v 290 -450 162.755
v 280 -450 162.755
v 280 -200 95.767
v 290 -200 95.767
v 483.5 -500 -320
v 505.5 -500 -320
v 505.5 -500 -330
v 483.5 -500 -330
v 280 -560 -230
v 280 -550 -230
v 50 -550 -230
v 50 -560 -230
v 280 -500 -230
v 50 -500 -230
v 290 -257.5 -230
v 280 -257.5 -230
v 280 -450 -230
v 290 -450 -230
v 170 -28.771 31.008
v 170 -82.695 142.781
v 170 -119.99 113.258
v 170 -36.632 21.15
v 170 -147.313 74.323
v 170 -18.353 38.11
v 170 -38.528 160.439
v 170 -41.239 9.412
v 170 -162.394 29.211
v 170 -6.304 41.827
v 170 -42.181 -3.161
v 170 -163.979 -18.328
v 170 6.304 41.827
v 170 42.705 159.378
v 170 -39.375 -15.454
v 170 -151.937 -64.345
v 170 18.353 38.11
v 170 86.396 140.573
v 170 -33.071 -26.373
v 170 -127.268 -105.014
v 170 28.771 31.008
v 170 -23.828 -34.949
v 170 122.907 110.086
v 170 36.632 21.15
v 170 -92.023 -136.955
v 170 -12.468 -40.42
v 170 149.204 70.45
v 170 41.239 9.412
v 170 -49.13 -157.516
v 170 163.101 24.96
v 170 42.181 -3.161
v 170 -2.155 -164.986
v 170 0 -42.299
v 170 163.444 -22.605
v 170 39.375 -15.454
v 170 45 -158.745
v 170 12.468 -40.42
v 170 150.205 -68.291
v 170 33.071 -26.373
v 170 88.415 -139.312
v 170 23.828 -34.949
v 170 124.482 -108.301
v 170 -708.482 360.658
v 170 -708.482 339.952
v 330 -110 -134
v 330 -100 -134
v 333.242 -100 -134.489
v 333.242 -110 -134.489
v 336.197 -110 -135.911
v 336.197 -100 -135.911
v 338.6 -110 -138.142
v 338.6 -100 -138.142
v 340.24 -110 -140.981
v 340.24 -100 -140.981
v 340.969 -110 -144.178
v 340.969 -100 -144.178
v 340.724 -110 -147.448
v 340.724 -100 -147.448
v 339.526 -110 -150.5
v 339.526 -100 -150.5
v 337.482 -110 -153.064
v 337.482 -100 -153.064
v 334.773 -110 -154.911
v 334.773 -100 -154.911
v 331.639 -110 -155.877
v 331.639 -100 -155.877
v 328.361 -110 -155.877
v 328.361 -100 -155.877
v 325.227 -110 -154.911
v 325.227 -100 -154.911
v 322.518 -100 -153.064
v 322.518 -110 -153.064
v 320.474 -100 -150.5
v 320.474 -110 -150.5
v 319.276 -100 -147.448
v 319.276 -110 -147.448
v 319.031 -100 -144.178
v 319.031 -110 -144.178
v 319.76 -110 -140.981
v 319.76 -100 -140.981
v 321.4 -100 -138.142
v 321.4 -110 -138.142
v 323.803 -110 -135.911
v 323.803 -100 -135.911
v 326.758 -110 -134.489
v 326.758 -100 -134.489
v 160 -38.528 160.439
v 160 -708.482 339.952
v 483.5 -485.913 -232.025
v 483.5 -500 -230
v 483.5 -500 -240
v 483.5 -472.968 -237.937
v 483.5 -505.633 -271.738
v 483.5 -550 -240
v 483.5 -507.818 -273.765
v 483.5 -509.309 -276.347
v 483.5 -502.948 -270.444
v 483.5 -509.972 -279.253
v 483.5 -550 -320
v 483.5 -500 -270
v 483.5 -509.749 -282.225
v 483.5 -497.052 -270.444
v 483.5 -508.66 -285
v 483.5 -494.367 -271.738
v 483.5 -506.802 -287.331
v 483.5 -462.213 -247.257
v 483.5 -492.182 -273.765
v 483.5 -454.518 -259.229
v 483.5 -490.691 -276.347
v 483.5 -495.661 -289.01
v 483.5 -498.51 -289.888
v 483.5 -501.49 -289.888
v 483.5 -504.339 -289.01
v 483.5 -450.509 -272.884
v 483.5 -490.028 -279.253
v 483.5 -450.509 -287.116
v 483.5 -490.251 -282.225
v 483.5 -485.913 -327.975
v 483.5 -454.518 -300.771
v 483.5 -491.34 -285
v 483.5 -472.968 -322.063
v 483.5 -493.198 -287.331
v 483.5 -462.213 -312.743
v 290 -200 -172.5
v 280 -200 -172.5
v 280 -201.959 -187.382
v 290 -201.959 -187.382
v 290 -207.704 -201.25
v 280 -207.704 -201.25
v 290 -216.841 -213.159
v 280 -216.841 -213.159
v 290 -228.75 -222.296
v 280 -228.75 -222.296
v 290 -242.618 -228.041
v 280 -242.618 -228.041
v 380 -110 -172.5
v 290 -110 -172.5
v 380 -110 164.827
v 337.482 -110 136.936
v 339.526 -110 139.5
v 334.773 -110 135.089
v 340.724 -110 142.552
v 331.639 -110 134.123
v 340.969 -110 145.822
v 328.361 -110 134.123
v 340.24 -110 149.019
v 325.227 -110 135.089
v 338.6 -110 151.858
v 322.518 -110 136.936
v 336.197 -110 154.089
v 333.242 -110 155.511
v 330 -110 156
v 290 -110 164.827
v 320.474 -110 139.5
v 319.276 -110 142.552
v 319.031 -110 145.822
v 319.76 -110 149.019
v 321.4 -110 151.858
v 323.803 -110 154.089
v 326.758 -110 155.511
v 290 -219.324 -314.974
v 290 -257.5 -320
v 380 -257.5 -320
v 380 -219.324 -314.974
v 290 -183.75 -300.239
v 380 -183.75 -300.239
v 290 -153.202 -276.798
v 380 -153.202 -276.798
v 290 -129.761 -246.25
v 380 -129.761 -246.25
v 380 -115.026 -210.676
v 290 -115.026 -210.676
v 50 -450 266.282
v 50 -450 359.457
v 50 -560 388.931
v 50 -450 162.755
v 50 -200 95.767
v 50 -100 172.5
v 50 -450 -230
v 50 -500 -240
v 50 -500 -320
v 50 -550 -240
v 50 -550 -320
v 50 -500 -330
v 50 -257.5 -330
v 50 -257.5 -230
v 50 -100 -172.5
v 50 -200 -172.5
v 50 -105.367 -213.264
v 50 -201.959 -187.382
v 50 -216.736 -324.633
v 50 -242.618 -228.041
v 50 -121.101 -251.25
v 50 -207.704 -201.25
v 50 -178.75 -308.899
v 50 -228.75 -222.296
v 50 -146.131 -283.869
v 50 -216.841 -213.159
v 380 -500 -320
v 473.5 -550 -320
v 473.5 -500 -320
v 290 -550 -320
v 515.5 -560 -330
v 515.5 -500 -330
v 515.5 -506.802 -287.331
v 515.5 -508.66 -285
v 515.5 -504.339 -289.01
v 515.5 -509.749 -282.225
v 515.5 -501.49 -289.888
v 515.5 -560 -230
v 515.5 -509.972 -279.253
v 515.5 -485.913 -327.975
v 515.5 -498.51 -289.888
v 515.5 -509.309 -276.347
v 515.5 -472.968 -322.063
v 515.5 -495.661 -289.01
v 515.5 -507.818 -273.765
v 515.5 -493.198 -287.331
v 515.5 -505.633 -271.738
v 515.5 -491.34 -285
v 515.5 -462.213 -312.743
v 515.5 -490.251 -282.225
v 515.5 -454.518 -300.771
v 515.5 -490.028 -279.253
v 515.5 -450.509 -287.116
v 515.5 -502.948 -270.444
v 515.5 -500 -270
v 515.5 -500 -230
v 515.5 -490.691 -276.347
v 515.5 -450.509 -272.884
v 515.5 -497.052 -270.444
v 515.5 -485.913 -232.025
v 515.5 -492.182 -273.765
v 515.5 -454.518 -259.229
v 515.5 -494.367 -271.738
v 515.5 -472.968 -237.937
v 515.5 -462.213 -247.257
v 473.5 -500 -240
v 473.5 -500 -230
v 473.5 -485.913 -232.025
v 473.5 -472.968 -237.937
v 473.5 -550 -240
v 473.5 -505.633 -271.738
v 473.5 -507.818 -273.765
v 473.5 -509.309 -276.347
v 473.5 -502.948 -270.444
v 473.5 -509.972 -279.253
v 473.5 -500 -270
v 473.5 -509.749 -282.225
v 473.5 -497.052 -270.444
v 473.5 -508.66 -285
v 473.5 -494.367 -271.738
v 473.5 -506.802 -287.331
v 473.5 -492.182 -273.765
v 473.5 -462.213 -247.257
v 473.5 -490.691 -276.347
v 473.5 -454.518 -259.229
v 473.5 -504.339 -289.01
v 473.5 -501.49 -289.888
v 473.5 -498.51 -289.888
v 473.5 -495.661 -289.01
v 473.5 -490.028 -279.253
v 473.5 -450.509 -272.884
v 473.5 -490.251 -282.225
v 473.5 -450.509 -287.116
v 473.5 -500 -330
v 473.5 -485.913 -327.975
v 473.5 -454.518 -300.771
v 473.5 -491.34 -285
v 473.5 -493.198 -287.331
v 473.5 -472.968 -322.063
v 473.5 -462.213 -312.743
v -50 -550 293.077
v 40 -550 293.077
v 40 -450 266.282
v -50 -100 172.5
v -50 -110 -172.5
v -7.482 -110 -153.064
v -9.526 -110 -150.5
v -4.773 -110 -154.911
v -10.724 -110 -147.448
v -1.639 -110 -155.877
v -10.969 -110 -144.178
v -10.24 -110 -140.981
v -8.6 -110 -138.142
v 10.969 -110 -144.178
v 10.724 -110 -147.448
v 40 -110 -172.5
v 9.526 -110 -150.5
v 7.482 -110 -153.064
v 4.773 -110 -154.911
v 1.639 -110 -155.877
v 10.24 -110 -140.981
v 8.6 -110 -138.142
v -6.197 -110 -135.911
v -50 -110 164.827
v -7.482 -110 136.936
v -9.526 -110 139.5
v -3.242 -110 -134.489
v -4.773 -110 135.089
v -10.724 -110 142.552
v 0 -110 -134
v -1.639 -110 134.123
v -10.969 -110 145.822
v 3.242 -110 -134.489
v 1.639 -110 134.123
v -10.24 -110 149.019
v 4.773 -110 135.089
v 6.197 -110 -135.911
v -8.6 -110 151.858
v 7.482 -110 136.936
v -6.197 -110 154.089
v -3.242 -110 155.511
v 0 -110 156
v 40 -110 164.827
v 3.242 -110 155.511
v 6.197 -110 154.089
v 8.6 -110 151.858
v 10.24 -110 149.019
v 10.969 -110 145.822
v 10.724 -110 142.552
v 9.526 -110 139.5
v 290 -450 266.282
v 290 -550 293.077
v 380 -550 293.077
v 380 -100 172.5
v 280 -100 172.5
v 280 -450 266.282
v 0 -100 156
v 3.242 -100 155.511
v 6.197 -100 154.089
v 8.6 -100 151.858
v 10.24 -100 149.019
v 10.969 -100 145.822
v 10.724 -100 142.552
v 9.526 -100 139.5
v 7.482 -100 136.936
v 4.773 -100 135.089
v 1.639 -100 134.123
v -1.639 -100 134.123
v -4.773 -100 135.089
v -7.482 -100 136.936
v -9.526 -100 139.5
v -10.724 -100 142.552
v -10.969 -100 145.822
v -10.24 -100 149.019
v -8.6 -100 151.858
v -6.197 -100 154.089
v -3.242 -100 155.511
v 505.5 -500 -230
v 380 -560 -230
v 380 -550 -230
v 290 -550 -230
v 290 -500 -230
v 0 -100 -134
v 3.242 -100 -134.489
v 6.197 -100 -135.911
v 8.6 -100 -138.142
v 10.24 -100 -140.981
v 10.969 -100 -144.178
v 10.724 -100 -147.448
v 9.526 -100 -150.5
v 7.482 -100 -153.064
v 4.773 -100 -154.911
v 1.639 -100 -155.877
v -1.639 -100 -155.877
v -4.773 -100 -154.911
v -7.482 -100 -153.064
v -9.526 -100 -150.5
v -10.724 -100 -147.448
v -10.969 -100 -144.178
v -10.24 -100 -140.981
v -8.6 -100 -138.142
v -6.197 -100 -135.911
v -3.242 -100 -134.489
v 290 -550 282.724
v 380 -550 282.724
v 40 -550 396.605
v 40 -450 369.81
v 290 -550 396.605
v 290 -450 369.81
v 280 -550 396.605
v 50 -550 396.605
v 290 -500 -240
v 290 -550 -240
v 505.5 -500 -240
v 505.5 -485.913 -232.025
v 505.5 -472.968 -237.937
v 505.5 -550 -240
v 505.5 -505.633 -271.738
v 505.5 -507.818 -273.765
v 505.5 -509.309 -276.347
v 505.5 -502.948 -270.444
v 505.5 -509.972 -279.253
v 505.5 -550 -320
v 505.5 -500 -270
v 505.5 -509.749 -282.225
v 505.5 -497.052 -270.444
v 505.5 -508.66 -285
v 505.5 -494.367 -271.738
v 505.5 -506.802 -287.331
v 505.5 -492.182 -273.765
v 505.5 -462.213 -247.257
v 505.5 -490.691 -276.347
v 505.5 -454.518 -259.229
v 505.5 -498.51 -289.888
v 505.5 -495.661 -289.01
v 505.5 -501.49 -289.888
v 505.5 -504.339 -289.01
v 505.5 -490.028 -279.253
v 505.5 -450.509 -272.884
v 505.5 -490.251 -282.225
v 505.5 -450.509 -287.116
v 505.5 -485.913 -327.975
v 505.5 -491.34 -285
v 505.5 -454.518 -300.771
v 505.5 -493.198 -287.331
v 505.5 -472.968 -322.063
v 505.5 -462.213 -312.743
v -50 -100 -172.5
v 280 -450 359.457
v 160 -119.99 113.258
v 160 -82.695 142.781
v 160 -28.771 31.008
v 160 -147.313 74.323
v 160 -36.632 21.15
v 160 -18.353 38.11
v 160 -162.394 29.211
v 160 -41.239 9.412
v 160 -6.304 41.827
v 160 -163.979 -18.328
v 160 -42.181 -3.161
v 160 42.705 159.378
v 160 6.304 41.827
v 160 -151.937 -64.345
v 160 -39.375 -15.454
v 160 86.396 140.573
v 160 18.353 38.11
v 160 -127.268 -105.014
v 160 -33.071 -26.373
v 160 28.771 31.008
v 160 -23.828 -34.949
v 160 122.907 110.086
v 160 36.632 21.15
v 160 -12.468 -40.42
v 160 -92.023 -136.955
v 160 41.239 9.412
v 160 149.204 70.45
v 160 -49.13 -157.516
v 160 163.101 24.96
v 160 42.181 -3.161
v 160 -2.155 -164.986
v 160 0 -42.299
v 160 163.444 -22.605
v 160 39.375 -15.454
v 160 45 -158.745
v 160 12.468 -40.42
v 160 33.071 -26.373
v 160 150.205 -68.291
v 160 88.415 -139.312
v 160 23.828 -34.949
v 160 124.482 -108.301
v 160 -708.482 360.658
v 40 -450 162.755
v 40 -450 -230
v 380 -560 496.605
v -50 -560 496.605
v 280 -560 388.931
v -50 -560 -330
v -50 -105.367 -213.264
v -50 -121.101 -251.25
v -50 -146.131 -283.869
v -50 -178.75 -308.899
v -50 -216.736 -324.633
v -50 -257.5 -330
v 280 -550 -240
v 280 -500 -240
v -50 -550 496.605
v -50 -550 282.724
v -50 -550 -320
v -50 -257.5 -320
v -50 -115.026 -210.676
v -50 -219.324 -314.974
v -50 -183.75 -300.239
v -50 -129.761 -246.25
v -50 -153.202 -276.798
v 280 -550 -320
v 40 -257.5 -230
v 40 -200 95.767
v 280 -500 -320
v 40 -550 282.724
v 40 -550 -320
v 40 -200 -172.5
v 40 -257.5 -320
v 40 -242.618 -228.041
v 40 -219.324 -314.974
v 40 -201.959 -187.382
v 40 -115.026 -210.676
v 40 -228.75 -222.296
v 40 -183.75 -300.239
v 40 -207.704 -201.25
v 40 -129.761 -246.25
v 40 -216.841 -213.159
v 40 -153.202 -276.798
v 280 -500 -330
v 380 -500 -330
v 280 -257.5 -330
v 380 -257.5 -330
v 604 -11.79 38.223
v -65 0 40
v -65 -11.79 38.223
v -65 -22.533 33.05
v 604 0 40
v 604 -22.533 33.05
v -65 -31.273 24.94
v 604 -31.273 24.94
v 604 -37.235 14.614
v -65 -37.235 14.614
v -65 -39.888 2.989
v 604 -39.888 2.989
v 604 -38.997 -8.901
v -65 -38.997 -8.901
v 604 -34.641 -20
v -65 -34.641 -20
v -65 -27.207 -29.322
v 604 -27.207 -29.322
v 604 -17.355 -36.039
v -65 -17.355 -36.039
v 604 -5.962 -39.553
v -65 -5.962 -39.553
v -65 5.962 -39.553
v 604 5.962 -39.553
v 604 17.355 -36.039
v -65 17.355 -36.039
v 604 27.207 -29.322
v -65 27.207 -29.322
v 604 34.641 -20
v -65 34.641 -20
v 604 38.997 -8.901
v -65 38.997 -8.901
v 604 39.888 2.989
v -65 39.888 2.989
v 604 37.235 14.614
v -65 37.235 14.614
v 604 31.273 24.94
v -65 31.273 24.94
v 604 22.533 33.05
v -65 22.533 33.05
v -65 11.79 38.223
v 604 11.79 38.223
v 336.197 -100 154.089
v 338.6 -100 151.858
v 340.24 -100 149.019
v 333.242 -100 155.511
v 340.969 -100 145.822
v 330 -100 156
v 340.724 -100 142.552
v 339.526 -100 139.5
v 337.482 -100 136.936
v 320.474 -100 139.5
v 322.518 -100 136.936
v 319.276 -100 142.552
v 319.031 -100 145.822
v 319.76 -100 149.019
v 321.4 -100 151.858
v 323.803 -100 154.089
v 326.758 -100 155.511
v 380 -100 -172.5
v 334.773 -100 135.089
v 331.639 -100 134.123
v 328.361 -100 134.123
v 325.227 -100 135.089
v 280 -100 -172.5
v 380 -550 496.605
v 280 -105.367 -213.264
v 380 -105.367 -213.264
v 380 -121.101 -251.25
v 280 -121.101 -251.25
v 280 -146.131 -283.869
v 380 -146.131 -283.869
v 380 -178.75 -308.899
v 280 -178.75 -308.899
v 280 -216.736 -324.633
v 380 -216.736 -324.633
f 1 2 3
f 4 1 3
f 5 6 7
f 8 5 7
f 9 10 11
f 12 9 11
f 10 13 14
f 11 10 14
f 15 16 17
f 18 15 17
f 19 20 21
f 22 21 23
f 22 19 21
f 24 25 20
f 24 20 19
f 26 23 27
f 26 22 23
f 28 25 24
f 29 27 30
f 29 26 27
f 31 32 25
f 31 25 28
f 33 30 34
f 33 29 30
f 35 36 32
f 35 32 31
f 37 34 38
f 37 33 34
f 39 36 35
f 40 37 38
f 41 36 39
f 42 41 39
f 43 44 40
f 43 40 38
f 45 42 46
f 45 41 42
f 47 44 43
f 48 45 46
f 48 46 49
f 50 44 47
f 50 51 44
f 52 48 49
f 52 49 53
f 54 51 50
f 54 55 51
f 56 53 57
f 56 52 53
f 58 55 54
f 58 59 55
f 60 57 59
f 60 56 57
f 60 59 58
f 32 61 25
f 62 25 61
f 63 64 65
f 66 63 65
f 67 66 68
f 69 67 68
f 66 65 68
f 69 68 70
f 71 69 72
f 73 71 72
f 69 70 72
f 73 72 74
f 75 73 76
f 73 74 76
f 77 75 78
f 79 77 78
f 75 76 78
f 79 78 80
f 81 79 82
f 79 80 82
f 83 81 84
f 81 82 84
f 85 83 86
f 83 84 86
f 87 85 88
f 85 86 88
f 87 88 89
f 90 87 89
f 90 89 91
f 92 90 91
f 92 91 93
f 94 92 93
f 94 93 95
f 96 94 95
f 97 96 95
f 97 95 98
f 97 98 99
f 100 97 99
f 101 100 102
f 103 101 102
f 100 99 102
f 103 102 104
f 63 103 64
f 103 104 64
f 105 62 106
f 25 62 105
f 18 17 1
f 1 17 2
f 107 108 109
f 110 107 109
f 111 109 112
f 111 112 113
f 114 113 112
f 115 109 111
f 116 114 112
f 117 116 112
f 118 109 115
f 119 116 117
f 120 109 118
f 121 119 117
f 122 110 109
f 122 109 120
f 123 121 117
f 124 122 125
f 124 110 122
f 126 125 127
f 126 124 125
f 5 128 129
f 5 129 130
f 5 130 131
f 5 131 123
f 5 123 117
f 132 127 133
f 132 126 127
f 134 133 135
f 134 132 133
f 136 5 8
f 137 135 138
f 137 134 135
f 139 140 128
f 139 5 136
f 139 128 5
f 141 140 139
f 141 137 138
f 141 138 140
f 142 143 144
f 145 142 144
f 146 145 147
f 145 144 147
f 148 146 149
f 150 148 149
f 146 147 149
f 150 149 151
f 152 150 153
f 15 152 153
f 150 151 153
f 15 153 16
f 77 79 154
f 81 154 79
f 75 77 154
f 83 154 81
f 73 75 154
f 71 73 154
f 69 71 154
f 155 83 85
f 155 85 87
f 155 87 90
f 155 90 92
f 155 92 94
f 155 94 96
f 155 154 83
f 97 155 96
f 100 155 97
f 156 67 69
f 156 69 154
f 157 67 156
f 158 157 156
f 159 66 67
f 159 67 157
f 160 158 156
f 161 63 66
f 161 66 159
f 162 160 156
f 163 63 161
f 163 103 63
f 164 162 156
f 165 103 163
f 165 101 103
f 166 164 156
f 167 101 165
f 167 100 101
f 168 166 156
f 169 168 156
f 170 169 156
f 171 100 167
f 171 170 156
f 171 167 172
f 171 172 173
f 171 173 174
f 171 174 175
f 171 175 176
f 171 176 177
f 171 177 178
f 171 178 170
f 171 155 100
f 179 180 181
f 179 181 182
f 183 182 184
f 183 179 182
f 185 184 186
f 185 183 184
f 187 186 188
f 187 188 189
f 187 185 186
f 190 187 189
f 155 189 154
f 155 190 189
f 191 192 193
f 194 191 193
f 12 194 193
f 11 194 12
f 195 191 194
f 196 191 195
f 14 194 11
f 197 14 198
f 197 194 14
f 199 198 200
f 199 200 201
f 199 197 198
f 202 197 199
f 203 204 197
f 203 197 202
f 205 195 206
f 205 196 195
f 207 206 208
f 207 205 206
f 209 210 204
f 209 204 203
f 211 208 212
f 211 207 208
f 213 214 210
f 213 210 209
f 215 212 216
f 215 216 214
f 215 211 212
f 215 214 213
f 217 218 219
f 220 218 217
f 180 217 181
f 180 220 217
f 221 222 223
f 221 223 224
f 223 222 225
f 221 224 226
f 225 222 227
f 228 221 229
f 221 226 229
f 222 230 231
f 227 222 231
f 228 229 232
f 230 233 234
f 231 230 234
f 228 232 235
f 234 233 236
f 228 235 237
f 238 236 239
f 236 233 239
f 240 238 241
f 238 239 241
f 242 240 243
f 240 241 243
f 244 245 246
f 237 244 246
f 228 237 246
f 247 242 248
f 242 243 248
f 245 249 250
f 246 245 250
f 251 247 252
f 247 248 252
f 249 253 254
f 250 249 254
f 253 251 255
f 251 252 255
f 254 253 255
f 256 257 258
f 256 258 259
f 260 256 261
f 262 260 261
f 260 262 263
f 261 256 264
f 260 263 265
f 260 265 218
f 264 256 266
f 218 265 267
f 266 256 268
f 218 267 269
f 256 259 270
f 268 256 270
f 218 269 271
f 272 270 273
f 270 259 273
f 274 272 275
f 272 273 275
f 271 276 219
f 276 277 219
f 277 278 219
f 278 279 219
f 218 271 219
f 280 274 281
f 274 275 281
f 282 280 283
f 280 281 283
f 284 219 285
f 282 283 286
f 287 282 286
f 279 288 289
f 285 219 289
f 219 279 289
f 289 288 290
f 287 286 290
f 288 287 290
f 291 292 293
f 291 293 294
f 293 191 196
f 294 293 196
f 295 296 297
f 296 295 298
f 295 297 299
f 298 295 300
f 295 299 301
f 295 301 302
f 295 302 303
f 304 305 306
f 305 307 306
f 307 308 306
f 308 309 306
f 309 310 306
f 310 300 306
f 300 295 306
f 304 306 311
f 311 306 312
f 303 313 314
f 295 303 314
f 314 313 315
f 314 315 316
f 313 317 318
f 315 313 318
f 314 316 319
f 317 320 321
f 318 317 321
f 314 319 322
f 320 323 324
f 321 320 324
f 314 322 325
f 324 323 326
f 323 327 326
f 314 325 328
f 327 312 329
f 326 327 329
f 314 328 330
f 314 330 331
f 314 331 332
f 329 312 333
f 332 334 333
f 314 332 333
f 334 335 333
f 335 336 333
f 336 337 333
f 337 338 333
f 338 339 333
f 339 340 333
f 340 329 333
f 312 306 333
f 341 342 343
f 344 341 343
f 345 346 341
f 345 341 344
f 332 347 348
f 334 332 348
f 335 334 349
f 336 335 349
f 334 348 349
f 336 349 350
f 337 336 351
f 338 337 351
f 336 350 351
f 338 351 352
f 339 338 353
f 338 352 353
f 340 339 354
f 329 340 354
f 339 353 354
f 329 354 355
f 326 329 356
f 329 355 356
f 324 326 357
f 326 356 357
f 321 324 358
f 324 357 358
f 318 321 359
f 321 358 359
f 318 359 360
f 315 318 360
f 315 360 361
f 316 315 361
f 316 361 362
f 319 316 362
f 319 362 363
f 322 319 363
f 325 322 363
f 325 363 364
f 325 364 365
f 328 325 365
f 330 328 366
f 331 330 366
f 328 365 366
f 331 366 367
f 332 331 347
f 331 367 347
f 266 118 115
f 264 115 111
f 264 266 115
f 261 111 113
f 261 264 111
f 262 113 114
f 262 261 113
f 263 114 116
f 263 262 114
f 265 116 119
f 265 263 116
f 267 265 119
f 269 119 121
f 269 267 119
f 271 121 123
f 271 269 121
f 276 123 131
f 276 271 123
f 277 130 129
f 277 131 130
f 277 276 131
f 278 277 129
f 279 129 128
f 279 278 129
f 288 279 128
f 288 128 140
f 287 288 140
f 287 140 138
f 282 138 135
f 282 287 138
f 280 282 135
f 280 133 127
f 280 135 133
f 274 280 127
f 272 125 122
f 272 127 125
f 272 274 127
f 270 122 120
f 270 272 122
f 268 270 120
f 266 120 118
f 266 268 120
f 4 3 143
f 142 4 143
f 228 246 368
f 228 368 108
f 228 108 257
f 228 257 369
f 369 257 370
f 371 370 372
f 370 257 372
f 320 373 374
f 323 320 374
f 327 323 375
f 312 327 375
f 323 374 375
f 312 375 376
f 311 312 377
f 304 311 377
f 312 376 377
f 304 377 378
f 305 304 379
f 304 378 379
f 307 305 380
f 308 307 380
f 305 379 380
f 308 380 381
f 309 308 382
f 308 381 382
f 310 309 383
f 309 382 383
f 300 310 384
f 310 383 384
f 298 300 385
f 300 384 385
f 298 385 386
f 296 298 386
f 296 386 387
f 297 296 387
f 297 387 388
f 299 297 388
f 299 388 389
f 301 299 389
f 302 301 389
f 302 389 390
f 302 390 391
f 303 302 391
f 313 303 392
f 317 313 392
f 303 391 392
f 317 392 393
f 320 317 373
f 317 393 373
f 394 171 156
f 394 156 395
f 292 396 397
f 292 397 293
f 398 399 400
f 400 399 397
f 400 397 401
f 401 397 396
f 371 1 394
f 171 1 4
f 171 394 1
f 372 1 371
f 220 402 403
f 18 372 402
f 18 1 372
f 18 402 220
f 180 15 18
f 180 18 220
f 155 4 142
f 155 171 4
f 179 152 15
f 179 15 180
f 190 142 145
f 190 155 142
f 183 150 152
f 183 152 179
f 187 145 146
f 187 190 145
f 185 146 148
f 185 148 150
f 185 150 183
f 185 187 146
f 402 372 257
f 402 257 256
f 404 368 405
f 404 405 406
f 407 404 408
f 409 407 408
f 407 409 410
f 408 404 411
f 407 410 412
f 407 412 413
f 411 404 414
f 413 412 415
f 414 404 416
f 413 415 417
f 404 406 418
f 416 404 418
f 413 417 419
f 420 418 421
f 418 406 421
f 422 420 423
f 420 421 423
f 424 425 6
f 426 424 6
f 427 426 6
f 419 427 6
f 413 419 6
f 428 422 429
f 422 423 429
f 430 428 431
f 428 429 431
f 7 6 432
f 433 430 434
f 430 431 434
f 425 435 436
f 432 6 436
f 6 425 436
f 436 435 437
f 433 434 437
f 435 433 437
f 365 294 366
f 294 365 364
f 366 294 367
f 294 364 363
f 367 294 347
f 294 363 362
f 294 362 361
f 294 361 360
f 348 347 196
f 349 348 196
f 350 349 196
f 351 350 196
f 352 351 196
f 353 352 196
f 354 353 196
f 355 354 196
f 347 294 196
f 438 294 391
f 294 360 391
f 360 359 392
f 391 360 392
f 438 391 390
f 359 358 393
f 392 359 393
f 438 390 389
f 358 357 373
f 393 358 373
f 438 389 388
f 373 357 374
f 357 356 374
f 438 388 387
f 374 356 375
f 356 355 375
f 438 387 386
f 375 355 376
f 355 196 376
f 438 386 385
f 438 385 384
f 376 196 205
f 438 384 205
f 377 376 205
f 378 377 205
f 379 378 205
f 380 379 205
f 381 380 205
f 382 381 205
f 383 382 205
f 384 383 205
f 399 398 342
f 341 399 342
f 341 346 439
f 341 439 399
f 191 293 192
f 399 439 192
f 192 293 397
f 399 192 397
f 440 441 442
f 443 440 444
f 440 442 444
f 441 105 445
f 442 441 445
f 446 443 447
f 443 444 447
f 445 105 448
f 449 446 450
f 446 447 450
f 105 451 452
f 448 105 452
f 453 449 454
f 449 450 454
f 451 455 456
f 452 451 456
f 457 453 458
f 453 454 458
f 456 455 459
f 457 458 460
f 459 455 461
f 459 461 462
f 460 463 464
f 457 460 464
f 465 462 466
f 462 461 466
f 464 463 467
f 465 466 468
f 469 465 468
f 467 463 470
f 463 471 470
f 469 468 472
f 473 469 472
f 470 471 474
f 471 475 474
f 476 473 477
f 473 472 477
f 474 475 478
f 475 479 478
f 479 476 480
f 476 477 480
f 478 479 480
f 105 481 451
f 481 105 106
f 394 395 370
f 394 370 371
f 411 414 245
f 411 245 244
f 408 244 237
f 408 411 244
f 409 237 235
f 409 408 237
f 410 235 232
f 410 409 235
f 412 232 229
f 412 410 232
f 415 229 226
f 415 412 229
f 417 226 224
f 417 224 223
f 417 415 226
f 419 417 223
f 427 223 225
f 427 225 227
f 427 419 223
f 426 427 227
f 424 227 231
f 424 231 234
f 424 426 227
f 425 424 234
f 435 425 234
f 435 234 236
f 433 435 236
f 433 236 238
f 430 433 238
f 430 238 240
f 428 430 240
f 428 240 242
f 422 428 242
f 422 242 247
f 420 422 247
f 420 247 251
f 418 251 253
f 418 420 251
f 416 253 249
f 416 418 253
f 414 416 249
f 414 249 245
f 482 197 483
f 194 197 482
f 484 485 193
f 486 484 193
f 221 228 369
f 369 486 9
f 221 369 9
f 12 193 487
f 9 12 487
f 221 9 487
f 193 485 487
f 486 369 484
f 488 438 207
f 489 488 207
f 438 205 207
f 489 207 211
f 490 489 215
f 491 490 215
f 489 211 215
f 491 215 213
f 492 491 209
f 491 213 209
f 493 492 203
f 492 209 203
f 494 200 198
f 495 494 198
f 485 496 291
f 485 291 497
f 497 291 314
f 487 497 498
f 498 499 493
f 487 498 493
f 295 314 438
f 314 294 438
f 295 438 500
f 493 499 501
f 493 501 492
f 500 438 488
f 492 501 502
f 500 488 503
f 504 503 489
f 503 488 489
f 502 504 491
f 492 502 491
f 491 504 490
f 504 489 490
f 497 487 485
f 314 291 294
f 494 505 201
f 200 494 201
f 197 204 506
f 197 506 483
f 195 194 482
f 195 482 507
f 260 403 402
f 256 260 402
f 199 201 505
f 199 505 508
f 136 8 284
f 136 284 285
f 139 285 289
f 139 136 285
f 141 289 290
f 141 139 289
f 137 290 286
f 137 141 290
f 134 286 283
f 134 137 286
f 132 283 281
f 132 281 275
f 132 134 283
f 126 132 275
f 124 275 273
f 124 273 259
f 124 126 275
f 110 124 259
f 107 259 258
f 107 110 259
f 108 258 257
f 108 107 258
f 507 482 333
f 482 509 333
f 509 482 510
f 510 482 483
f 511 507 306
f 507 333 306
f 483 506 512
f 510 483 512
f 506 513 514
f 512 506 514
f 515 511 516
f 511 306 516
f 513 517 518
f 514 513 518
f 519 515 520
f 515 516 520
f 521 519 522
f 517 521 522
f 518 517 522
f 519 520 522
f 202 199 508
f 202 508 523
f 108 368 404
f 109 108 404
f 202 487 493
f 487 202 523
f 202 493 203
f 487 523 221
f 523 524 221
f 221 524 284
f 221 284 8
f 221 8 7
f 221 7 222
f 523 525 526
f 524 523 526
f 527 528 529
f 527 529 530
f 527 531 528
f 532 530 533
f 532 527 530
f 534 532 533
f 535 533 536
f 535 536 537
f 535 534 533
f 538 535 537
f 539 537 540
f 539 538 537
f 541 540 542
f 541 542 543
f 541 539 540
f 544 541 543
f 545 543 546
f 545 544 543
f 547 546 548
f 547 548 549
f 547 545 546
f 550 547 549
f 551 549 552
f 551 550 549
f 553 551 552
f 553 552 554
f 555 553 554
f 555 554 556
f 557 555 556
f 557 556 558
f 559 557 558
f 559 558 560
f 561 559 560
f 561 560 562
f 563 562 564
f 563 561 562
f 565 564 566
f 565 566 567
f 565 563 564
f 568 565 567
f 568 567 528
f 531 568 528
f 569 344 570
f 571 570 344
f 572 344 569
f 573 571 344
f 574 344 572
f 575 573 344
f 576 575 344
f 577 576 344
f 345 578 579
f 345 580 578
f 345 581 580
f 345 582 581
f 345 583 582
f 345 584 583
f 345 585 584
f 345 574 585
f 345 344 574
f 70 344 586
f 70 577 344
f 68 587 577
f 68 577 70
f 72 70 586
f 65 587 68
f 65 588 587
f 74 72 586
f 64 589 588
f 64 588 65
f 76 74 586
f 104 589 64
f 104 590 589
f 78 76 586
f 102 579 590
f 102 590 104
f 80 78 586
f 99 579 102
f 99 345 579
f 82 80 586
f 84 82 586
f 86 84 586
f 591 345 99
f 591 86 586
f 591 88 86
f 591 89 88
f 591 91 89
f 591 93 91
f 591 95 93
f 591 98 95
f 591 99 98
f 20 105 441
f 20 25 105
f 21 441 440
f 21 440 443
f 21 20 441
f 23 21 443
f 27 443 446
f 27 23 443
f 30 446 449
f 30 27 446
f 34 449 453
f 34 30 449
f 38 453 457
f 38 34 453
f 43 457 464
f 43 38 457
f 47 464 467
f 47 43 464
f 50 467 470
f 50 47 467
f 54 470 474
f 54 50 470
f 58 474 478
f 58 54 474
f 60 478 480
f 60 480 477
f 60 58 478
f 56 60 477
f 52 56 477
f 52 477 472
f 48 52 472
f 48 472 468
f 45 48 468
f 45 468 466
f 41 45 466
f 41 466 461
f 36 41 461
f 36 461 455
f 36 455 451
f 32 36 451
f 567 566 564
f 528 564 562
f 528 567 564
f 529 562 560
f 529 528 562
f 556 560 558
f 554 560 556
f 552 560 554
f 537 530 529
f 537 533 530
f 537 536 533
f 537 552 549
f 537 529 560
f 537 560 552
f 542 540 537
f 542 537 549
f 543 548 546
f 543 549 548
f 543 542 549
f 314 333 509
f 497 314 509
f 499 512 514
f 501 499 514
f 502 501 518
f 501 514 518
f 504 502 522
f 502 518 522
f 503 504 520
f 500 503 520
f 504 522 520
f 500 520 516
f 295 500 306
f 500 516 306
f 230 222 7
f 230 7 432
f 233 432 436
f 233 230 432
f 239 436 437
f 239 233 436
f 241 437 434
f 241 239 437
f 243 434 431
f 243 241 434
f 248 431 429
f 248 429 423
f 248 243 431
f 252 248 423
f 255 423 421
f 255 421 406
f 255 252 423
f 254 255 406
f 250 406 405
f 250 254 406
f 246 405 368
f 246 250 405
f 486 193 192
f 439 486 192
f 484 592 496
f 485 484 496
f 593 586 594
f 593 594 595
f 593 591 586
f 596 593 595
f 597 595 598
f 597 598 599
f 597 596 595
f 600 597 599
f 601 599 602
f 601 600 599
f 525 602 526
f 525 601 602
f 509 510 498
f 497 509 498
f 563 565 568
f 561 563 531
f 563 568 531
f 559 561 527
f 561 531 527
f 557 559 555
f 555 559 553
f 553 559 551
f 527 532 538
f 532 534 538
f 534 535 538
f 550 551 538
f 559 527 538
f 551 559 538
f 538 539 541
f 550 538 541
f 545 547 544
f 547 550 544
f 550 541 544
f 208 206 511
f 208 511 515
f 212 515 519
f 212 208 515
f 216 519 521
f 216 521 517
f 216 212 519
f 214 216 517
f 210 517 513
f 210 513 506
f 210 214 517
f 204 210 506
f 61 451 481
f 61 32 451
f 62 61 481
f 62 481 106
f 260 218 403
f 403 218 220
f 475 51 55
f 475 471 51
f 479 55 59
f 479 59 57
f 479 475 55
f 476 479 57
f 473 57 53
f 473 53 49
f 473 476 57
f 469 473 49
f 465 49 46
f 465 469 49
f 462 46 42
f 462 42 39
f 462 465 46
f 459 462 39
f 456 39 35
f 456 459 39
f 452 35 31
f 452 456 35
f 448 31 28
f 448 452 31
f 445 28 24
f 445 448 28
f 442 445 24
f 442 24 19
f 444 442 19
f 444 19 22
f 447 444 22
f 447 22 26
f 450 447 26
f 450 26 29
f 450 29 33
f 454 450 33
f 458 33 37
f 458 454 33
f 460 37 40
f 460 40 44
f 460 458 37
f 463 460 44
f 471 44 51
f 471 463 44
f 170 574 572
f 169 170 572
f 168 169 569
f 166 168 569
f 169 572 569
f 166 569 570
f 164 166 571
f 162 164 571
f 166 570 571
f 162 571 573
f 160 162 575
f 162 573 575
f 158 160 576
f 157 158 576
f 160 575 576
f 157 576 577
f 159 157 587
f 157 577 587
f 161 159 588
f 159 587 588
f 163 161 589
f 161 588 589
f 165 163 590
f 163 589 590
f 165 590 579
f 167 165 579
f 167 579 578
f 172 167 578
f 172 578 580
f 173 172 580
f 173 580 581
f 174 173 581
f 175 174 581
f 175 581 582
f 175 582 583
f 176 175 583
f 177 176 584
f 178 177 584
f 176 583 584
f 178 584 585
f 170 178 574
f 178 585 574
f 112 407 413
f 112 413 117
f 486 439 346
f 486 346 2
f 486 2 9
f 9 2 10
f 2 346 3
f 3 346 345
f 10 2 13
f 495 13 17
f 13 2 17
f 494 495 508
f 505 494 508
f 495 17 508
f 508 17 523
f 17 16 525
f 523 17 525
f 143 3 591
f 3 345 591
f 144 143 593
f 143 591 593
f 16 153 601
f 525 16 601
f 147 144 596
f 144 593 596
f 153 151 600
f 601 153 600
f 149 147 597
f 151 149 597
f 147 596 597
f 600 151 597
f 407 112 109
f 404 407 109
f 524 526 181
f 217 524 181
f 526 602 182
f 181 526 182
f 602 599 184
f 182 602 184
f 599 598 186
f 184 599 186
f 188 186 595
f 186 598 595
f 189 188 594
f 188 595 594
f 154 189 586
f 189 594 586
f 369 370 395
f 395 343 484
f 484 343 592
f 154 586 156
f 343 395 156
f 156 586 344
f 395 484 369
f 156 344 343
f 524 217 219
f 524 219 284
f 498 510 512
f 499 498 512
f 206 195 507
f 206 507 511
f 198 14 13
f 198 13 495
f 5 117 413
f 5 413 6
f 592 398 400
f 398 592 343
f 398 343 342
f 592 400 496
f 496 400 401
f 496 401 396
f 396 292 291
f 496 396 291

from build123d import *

# Parameters (mm, degrees)
SKETCH2_W               = 669
SKETCH2_H               = 40
SKETCH6_R               = 10
BOSS_EXTRUDE1_DEPTH     = 21
CUT_EXTRUDE1_DEPTH      = 943.072184071
CUT_EXTRUDE1_DEPTH_BACK = 943.072184071
SKETCH7_W               = 22
SKETCH7_H               = 150
BOSS_EXTRUDE12_DEPTH    = 10
EXTRUDE_THIN8_DEPTH     = 90
EXTRUDE_THIN9_START     = -465.5
SKETCH34_W              = 10
SKETCH34_H              = 50
EXTRUDE_THIN9_DEPTH     = 455.5
SKETCH36_W              = 230
SKETCH36_H              = 626.604754635
BOSS_EXTRUDE13_DEPTH    = 10
BOSS_EXTRUDE14_START    = -240
BOSS_EXTRUDE14_DEPTH    = 230
SKETCH38_R              = 11
CUT_EXTRUDE3_DEPTH      = 10
SKETCH20_R              = 42.299208509
BOSS_EXTRUDE15_DEPTH    = 5


with BuildPart() as part:
    # Sketch2 → Revolve1 (revolve)
    with BuildSketch(Plane.XY, mode=Mode.PRIVATE) as revolve1_sk:
        with Locations((269.5, 20)):
            Rectangle(SKETCH2_W, SKETCH2_H)
    revolve(revolve1_sk.sketch.rotate(Axis((-65, 0, 0), (1, 0, 0)), 90), axis=Axis((-65, 0, 0), (1, 0, 0)))


with BuildPart() as body_2:
    # Sketch6 → Boss-Extrude1 (new, symmetric)
    with BuildSketch(Plane(origin=(494.5, 0, 0), x_dir=(0, 0, -1), z_dir=(1, 0, 0))):
        with BuildLine():
            Line((230, -500), (230, -550))
            Line((230, -550), (280, -550))
            Line((280, -550), (330, -550))
            Line((330, -550), (330, -500))
            ThreePointArc((330, -500), (280, -450), (230, -500))
        make_face()
        with Locations(Location((280, -500, 0), (0, 0, 180))):
            Circle(SKETCH6_R, mode=Mode.SUBTRACT)
    extrude(amount=BOSS_EXTRUDE1_DEPTH, both=True)

    # Sketch7 → Cut-Extrude1 (cut, two sides: drawn at the far end of the back side and taken through both)
    with BuildSketch(Plane(origin=(625, 0, 0), x_dir=(-1, 0, 0), z_dir=(0, -1, 0)).offset(-CUT_EXTRUDE1_DEPTH_BACK)):
        with Locations((130.5, 280)):
            Rectangle(SKETCH7_W, SKETCH7_H)
    extrude(amount=CUT_EXTRUDE1_DEPTH + CUT_EXTRUDE1_DEPTH_BACK, mode=Mode.SUBTRACT)


with BuildPart() as cut_extrude1_piece_1:
    # of the separate pieces the step leaves, piece 1, a body of its own (cut_extrude1_pieces)
    add(body_2.part.solids().sort_by_distance((483.5, -500, -230))[0])



with BuildPart() as cut_extrude1_piece_2:
    # of the separate pieces the step leaves, piece 2, a body of its own (cut_extrude1_pieces)
    add(body_2.part.solids().sort_by_distance((515.5, -500, -230))[0])


with BuildPart() as body_4:
    # Sketch30 → Boss-Extrude12 (new body)
    with BuildSketch(Plane(origin=(50, 0, 0), x_dir=(0, 0, -1), z_dir=(1, 0, 0))):
        with BuildLine():
            ThreePointArc((330, -257.5), (283.869318037, -146.130681963), (172.5, -100))
            Line((172.5, -100), (122.5, -100))
            Line((122.5, -100), (-172.5, -100))
            Line((-172.5, -100), (-266.282217351, -450))
            Line((-266.282217351, -450), (-369.809835392, -450))
            Line((-369.809835392, -450), (-396.604754635, -550))
            Line((-396.604754635, -550), (-293.077136594, -550))
            Line((-293.077136594, -550), (-189.549518553, -550))
            Line((-189.549518553, -550), (230, -550))
            Line((230, -550), (330, -550))
            Line((330, -550), (330, -500))
            Line((330, -500), (330, -257.5))
        make_face()
        with BuildLine():
            ThreePointArc((172.5, -200), (213.158639918, -216.841360082), (230, -257.5))
            Line((230, -257.5), (230, -450))
            Line((230, -450), (-162.75459931, -450))
            Line((-162.75459931, -450), (-95.767301202, -200))
            Line((-95.767301202, -200), (122.5, -200))
            Line((122.5, -200), (172.5, -200))
        make_face(mode=Mode.SUBTRACT)
    extrude(amount=-BOSS_EXTRUDE12_DEPTH)

    # Sketch31 → Extrude-Thin8 (add)
    with BuildSketch(Plane.ZY.offset(-40)):
        with BuildLine():
            Line((293.077136594, -550), (172.5, -100))
            Line((172.5, -100), (-172.5, -100))
            ThreePointArc((-172.5, -100), (-283.869318037, -146.130681963), (-330, -257.5))
            Line((-330, -257.5), (-330, -550))
            Line((-330, -550), (-320, -550))
            Line((-320, -550), (-320, -257.5))
            ThreePointArc((-320, -257.5), (-276.798250225, -153.201749775), (-172.5, -110))
            Line((-172.5, -110), (164.82673012, -110))
            Line((164.82673012, -110), (283.417878331, -552.588190451))
            Line((283.417878331, -552.588190451), (293.077136594, -550))
        make_face()
    extrude(amount=EXTRUDE_THIN8_DEPTH)


with BuildPart() as body_5:
    # Mirror8: mirrored copy
    add(body_4.part.mirror(Plane(origin=(165, 0, 0), x_dir=(0, 0, 1), z_dir=(1, 0, 0))))


with BuildPart() as cut_extrude1_piece_1_1:
    add(cut_extrude1_piece_1.part)

    add(cut_extrude1_piece_2.part)  # Extrude-Thin9 merges Cut-Extrude1 piece 2

    add(body_4.part)  # Extrude-Thin9 merges body 4

    add(body_5.part)  # Extrude-Thin9 merges body 5
    # Sketch34 → Extrude-Thin9 (add)
    with BuildSketch(Plane(origin=(515.5, 0, 0), x_dir=(0, 0, -1), z_dir=(1, 0, 0)).offset(EXTRUDE_THIN9_START)):
        with Locations((235, -525)):
            Rectangle(SKETCH34_W, SKETCH34_H)
        with Locations((325, -525)):
            Rectangle(SKETCH34_W, SKETCH34_H)
    extrude(amount=EXTRUDE_THIN9_DEPTH)

    # Sketch36 → Boss-Extrude13 (add)
    with BuildSketch(Plane(origin=(0, -550, 0), x_dir=(-1, 0, 0), z_dir=(0, -1, 0))):
        Polygon((-280, 330), (-380, 330), (-515.5, 330), (-515.5, 230), (-380, 230), (-380, -496.604754635), (50, -496.604754635), (50, 330), (-50, 330), align=None)
        with Locations((-165, -83.302377317)):
            Rectangle(SKETCH36_W, SKETCH36_H, mode=Mode.SUBTRACT)
    extrude(amount=BOSS_EXTRUDE13_DEPTH)

    # Sketch37 → Boss-Extrude14 (add)
    with BuildSketch(Plane(origin=(290, 0, 0), x_dir=(0, 0, -1), z_dir=(1, 0, 0)).offset(BOSS_EXTRUDE14_START)):
        Polygon((-369.809835392, -450), (-396.604754635, -550), (-396.604754635, -560), (-388.931484755, -560), (-359.457073588, -450), align=None)
    extrude(amount=BOSS_EXTRUDE14_DEPTH)

    # Sketch38 → Cut-Extrude3 (cut)
    with BuildSketch(Plane(origin=(0, -100, 0), x_dir=(1, 0, 0), z_dir=(0, 1, 0))):
        with Locations(Location((0, 145, 0), (0, 0, 270))):
            Circle(SKETCH38_R)
        with Locations(Location((0, -145, 0), (0, 0, 270))):
            Circle(SKETCH38_R)
        with Locations(Location((330, 145, 0), (0, 0, 270))):
            Circle(SKETCH38_R)
        with Locations(Location((330, -145, 0), (0, 0, 270))):
            Circle(SKETCH38_R)
    extrude(amount=-CUT_EXTRUDE3_DEPTH, mode=Mode.SUBTRACT)


with BuildPart() as body_3:
    # Sketch20 → Boss-Extrude15 (new, symmetric)
    with BuildSketch(Plane(origin=(165, 0, 0), x_dir=(0, 0, -1), z_dir=(1, 0, 0))):
        with BuildLine():
            Line((-159.377761338, 42.705142442), (-360.657862956, -708.482423351))
            Line((-360.657862956, -708.482423351), (-339.952339348, -708.482423351))
            Line((-339.952339348, -708.482423351), (-160.438676803, -38.528314079))
            ThreePointArc((-160.438676803, -38.528314079), (164.98593013, -2.154729496), (-159.377761338, 42.705142442))
        make_face()
        Circle(SKETCH20_R, mode=Mode.SUBTRACT)
    extrude(amount=BOSS_EXTRUDE15_DEPTH, both=True)


solid = Compound([part.part, cut_extrude1_piece_1_1.part, body_3.part])
